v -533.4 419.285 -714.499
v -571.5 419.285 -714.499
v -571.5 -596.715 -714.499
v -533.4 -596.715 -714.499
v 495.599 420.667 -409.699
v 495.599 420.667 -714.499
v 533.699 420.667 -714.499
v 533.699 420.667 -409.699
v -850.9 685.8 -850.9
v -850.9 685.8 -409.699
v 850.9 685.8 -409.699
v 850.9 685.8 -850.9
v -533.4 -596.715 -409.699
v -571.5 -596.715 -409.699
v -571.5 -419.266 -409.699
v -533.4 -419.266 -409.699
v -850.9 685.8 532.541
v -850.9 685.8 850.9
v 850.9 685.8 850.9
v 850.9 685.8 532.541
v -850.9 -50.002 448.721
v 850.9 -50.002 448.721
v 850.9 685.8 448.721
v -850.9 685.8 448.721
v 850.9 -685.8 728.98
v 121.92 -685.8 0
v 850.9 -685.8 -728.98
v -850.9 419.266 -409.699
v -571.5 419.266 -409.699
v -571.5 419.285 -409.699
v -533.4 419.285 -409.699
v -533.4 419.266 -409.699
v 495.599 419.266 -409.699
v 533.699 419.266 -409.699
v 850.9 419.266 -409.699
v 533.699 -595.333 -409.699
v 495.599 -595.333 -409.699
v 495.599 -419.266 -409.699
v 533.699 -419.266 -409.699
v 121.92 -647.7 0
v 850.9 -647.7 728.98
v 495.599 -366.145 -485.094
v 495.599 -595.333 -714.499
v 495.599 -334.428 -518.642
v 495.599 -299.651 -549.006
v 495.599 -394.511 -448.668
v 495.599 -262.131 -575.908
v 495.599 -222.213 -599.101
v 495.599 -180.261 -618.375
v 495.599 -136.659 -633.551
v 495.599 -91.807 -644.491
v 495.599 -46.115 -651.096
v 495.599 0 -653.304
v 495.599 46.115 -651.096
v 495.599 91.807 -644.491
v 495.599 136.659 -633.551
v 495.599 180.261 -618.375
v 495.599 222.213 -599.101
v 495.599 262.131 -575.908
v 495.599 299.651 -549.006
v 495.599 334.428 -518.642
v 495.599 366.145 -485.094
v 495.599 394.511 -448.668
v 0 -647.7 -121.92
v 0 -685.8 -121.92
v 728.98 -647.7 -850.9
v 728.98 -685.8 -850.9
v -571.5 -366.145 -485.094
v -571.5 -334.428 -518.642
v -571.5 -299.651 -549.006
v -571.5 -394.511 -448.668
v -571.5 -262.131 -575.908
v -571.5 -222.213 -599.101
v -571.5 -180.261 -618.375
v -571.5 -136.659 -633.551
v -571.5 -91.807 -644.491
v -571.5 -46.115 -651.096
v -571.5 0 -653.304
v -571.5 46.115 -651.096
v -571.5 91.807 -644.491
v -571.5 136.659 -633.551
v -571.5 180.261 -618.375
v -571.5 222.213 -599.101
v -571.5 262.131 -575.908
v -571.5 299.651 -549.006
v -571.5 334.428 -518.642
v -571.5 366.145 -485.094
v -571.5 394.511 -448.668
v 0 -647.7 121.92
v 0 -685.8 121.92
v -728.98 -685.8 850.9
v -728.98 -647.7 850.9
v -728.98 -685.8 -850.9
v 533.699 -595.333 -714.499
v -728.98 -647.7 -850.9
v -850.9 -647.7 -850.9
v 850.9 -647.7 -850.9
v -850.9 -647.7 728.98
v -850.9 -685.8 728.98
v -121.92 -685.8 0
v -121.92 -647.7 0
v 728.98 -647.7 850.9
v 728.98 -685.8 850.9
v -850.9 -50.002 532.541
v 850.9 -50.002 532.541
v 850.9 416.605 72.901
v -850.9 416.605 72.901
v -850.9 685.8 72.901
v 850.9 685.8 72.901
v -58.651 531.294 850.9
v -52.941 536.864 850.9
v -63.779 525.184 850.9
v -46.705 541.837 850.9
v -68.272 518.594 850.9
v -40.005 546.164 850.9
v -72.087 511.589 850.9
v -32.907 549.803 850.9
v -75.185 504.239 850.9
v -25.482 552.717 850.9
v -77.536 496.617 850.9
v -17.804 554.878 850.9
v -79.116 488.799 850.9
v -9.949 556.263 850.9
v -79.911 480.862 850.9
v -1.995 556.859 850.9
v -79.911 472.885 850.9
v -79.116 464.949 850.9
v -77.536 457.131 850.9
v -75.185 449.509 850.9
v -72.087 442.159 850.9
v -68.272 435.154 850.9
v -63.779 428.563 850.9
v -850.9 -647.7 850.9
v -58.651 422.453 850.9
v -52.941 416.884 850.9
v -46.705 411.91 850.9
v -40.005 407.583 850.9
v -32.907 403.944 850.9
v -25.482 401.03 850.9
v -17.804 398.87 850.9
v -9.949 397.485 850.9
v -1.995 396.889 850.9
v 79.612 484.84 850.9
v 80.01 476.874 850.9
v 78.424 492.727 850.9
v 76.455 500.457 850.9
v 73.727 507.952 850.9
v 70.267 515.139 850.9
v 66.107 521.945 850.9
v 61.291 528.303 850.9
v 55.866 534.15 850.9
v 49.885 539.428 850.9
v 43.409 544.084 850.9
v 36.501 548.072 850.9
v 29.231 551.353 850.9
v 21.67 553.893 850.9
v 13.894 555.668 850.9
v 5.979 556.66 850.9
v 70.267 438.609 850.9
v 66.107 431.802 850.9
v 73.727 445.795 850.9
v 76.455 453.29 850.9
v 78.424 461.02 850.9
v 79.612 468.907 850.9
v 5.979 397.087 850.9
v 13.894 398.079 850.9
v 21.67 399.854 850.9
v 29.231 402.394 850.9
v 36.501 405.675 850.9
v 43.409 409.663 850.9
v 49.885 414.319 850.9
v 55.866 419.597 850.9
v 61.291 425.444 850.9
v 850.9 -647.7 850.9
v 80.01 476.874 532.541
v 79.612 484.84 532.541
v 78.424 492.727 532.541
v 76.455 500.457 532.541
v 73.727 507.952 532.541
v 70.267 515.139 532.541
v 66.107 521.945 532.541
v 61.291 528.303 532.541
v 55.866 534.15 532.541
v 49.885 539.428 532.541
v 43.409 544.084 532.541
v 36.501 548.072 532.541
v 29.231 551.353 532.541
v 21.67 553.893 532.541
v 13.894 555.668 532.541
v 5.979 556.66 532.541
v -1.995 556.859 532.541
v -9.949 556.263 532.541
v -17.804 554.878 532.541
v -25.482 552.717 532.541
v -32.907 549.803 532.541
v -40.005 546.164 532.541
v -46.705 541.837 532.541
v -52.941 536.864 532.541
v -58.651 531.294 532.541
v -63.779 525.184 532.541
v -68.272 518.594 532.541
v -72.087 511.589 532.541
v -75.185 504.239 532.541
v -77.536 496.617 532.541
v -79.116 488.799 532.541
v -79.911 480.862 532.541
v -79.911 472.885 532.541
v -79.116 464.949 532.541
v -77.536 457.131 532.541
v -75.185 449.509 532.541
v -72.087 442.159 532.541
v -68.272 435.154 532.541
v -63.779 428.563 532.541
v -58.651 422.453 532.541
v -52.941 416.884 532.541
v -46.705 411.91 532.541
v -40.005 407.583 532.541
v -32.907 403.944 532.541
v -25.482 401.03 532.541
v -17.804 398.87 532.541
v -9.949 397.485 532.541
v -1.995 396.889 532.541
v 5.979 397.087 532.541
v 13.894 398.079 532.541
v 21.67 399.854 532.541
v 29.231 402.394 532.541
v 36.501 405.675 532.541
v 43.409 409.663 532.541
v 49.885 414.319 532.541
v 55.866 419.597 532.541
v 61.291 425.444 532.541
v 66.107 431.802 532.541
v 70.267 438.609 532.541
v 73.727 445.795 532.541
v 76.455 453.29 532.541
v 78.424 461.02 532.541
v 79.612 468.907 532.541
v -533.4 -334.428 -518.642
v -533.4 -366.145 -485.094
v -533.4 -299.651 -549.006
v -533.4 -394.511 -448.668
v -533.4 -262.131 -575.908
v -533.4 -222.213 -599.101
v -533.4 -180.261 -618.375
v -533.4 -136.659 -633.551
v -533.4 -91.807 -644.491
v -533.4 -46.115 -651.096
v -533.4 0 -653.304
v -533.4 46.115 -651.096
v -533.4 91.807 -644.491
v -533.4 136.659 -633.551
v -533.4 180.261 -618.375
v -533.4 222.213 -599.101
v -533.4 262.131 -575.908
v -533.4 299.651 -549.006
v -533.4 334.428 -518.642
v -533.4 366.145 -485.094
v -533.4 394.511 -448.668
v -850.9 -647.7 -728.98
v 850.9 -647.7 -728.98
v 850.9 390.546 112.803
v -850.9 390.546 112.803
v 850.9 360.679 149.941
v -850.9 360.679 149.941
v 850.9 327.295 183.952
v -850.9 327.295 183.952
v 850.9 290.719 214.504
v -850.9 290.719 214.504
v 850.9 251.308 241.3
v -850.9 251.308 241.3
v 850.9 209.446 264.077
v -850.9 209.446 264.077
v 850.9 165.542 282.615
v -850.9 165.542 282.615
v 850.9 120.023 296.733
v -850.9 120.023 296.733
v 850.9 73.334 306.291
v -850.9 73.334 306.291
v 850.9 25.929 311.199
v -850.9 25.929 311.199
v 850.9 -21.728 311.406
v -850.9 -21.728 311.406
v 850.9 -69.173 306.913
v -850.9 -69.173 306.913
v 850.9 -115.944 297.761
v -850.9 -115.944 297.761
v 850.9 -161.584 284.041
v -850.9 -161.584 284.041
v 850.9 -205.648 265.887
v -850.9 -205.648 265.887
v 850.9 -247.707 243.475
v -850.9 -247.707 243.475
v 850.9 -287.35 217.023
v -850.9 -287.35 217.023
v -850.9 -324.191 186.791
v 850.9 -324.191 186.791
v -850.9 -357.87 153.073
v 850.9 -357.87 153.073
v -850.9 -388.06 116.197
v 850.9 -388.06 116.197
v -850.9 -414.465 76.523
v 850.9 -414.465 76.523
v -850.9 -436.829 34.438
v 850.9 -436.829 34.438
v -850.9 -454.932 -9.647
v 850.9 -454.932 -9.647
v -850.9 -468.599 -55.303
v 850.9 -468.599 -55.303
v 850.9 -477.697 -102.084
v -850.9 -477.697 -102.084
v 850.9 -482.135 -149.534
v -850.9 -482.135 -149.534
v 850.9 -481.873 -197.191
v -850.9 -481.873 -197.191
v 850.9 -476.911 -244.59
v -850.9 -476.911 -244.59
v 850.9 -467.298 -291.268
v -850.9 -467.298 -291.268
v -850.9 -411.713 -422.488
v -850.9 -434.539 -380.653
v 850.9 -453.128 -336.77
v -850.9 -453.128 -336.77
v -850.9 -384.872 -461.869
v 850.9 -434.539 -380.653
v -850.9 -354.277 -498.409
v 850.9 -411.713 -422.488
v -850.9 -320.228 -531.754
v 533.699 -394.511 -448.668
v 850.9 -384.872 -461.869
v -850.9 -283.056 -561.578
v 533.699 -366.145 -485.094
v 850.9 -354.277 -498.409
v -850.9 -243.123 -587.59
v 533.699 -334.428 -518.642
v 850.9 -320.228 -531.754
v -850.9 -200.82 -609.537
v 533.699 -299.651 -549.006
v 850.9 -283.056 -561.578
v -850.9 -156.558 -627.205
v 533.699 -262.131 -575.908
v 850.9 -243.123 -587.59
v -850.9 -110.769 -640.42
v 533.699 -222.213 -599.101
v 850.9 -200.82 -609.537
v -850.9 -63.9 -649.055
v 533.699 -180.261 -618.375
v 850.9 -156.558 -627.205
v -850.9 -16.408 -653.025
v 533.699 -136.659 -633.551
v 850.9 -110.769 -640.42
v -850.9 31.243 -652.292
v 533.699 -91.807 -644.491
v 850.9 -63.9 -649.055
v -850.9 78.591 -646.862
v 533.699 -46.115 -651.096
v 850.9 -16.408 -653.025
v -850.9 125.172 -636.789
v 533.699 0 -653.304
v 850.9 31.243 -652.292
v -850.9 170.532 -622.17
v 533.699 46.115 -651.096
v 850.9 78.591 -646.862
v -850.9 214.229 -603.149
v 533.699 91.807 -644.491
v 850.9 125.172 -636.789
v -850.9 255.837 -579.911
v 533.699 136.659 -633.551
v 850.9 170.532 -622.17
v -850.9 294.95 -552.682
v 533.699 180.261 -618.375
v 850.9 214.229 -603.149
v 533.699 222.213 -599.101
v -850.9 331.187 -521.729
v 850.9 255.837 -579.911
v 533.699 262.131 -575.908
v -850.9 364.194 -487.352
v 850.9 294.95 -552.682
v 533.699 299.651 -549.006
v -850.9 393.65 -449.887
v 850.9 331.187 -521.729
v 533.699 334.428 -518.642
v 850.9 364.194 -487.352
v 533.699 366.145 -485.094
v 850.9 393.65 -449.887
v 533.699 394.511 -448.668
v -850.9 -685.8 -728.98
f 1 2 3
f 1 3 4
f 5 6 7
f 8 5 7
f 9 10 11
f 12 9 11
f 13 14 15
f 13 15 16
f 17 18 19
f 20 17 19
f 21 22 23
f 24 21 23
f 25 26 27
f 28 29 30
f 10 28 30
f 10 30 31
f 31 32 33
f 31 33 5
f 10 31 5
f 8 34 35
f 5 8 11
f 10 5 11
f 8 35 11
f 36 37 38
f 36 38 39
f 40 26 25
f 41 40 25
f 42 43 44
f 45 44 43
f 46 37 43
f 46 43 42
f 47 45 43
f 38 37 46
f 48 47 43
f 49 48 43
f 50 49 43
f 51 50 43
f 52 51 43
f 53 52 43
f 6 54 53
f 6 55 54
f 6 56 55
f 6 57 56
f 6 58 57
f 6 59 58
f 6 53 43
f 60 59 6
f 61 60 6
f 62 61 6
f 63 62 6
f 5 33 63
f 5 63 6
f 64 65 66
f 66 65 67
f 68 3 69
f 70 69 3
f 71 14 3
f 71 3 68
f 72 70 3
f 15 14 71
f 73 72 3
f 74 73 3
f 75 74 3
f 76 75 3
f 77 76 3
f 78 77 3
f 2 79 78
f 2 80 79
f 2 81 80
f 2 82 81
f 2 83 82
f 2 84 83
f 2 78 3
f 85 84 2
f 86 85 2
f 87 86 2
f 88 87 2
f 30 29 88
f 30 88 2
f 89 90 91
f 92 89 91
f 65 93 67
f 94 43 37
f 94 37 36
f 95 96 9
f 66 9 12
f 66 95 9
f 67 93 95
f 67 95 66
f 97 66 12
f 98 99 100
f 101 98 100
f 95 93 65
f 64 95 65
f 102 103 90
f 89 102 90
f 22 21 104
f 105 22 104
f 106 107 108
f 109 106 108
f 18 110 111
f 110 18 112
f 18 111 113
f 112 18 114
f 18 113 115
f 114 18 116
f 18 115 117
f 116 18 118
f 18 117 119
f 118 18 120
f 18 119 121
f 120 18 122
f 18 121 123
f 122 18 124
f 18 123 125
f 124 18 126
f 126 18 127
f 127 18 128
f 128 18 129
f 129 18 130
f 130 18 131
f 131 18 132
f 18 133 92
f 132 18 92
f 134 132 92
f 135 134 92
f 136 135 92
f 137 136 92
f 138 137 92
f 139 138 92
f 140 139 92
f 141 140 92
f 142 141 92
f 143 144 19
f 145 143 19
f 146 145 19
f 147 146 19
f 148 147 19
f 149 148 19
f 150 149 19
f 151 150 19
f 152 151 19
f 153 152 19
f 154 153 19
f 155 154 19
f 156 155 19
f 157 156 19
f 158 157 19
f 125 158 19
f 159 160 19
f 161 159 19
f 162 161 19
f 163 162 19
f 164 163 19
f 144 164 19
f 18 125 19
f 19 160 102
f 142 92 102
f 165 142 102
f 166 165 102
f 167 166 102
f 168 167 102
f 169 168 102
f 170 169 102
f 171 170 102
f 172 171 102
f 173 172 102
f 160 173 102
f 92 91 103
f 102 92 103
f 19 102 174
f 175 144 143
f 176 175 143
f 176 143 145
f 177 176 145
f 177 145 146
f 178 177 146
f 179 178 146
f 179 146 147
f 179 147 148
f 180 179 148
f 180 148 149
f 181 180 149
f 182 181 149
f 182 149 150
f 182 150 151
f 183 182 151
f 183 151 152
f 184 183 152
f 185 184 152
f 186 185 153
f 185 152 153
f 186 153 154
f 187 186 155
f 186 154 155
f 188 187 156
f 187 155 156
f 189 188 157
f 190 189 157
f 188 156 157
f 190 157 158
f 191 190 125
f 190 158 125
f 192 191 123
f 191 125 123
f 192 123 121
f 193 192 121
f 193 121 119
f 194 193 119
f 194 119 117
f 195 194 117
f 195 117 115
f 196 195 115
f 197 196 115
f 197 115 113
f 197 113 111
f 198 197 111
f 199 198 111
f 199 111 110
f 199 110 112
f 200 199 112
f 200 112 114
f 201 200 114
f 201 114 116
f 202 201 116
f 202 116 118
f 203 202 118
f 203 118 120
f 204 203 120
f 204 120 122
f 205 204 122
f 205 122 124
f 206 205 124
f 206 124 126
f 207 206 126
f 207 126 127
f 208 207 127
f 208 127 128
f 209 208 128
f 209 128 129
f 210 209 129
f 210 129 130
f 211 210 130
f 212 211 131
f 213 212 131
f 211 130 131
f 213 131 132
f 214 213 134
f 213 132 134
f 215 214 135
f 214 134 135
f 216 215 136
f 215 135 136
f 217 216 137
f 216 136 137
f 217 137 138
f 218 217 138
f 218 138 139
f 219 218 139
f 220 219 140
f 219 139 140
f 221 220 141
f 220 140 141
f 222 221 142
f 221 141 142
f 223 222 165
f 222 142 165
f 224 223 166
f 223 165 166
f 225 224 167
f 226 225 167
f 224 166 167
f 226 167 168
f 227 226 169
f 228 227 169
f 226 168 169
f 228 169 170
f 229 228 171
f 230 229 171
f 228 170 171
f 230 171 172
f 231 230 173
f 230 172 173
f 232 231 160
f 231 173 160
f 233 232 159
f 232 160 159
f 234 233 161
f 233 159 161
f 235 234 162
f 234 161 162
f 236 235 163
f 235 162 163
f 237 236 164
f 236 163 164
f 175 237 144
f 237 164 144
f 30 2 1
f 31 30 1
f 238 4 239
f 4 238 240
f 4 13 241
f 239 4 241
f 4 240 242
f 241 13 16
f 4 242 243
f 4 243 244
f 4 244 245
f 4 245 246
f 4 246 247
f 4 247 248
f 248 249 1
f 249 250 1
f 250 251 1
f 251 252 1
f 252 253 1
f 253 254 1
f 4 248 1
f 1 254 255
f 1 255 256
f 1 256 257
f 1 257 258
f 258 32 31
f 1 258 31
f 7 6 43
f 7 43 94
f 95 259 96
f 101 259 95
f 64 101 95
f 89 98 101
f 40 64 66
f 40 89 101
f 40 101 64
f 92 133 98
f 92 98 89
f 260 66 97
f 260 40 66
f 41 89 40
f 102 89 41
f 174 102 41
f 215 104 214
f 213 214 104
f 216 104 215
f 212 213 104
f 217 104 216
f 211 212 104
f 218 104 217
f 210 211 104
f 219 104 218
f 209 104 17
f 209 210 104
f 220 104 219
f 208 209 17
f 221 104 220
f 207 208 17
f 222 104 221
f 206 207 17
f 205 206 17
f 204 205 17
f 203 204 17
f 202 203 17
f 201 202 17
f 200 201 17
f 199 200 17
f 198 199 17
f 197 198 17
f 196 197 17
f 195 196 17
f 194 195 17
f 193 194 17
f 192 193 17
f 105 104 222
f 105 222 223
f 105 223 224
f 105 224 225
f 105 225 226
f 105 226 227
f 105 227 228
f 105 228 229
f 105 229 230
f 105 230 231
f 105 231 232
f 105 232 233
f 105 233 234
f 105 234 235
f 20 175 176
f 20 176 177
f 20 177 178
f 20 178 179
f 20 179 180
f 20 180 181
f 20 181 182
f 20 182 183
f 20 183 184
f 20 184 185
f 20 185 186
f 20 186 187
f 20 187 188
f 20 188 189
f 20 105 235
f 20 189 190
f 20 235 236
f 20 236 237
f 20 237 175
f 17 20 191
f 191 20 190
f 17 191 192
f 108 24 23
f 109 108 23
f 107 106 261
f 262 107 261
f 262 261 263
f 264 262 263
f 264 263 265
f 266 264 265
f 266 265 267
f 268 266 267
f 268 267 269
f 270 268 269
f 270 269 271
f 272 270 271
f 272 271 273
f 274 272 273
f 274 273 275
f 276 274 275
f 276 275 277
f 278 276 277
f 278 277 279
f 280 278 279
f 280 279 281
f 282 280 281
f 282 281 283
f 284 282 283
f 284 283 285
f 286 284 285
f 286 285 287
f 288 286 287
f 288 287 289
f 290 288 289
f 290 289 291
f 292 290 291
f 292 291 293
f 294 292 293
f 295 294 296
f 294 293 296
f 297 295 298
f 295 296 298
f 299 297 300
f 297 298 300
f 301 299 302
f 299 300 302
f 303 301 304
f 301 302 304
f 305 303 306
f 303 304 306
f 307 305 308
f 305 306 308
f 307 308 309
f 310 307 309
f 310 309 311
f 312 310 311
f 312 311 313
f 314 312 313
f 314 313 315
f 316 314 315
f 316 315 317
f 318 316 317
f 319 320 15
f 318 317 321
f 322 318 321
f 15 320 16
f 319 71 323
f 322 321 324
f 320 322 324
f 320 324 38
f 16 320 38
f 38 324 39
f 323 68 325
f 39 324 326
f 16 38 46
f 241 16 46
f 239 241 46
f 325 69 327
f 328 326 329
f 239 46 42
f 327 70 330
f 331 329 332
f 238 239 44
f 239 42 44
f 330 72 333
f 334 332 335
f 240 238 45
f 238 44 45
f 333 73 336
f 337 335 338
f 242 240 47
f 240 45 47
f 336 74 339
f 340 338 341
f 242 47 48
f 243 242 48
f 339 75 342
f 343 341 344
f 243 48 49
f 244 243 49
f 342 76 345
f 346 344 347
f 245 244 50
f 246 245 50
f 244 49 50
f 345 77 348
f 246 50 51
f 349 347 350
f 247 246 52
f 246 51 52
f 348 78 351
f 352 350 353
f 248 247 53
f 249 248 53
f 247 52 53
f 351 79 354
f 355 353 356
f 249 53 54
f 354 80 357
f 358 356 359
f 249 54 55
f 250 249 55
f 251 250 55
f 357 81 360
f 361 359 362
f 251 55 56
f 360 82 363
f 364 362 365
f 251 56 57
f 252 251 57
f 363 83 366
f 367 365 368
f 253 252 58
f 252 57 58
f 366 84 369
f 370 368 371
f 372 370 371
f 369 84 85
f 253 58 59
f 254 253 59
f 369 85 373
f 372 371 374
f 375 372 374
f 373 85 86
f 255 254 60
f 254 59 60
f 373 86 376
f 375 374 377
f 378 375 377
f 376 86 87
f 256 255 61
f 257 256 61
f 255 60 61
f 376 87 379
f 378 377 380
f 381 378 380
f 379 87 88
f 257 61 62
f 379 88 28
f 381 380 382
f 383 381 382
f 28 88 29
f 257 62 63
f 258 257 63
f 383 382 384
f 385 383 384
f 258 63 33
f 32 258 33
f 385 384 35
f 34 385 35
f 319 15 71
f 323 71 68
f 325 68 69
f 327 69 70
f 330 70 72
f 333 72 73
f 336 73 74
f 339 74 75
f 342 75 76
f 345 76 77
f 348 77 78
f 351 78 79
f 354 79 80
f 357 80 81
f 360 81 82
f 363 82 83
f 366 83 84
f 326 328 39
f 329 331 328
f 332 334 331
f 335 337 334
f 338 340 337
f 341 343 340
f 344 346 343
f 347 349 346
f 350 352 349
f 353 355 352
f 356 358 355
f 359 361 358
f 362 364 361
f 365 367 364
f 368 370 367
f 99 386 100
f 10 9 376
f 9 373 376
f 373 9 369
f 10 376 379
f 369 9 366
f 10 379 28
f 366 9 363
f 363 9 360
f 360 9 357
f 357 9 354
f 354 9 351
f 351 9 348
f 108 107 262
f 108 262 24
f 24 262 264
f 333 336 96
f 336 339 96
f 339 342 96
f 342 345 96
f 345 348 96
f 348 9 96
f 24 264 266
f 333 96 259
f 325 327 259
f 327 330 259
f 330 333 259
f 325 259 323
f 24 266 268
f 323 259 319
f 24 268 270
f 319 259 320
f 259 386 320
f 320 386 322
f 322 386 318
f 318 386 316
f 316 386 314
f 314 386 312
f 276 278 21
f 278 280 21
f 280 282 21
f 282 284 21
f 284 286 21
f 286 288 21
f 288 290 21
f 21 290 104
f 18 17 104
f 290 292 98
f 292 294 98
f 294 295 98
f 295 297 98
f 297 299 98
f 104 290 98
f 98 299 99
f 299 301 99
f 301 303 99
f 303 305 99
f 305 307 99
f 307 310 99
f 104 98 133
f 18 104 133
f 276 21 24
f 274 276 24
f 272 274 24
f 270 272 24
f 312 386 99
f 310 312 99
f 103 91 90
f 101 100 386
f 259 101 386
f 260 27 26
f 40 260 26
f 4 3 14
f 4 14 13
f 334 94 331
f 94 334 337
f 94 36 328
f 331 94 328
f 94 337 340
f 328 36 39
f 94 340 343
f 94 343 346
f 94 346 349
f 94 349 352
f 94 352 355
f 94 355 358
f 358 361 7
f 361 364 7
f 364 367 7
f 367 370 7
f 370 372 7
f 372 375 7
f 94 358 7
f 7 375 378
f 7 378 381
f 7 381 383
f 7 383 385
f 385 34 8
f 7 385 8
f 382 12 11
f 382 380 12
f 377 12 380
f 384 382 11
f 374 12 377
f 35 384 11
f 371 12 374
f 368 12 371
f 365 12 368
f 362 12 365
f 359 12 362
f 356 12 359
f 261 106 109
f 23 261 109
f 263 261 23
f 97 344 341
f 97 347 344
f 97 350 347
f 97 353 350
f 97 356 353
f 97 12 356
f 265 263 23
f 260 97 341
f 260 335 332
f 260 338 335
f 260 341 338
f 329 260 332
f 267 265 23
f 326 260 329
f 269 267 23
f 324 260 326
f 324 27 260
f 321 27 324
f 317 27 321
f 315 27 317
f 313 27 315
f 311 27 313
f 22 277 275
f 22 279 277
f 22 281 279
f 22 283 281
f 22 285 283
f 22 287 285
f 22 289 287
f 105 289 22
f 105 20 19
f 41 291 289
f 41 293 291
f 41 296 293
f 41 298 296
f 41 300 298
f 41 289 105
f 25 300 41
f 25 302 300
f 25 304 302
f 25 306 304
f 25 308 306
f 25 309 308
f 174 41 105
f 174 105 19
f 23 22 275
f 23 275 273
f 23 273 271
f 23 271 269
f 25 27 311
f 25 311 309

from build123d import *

# Parameters (mm, degrees)
F0_W          = 1701.8
F0_H          = 1701.8
F1_DEPTH      = 685.8
F1_DEPTH_BACK = 685.8
F3_R          = 482.6
F5_DEPTH      = 1778
F4_W          = 741.2019371986
F4_H          = 241.3
F6_DEPTH      = 1778
F7_W          = 762
F7_H          = 83.82
F8_DEPTH      = 1778
F10_DEPTH     = 38.1
F12_R         = 80.01
F13_DEPTH     = 320.04
F15_W         = 38.1
F15_H         = 1016
F16_DEPTH     = 304.8


with BuildPart() as f1:
    # F0 (on Front) → F1 (new body, two sides)
    with BuildSketch(Plane.XZ) as f1_sk:
        Rectangle(F0_W, F0_H)
    extrude(amount=F1_DEPTH)
    extrude(f1_sk.sketch, amount=-F1_DEPTH_BACK)

    # F3 (on face) → F5 (cut)
    with BuildSketch(Plane.YZ.offset(850.9)):
        with Locations((0, -170.704353589)):
            Circle(F3_R)
    extrude(amount=-F5_DEPTH, mode=Mode.SUBTRACT)

    # F4 (on face) → F6 (cut)
    with BuildSketch(Plane.YZ.offset(850.9)):
        with Locations((370.6009685993, -47.7492743492)):
            Rectangle(F4_W, F4_H)
        Polygon((741.2019371986, -168.3992743492), (0, -168.3992743492), (0, -409.6992743492), (741.8479657151, -409.6992743492), (741.8479657151, -168.3992743492), align=None)
    extrude(amount=-F6_DEPTH, mode=Mode.SUBTRACT)

    # F7 (on face) → F8 (cut)
    with BuildSketch(Plane.YZ.offset(850.9)):
        with Locations((330.9977193773, 490.6306193733)):
            Rectangle(F7_W, F7_H)
    extrude(amount=-F8_DEPTH, mode=Mode.SUBTRACT)

    # F9 (on face) → F10 (cut)
    with BuildSketch(Plane.XZ.offset(685.8)):
        Polygon((850.9, 728.98), (850.9, 850.9), (728.98, 850.9), (0, 121.92), (121.92, 0), align=None)
        Polygon((850.9, -728.98), (121.92, 0), (0, -121.92), (728.98, -850.9), (850.9, -850.9), align=None)
        Polygon((0, -121.92), (121.92, 0), (0, 121.92), (-121.92, 0), align=None)
        Polygon((-121.92, 0), (0, 121.92), (-728.98, 850.9), (-850.9, 850.9), (-850.9, 728.98), align=None)
        Polygon((-728.98, -850.9), (0, -121.92), (-121.92, 0), (-850.9, -728.98), (-850.9, -850.9), align=None)
    extrude(amount=-F10_DEPTH, mode=Mode.SUBTRACT)

    # F12 (on face) → F13 (cut)
    with BuildSketch(Plane.XY.offset(850.9)):
        with Locations((0, 476.8736362457)):
            Circle(F12_R)
    extrude(amount=-F13_DEPTH, mode=Mode.SUBTRACT)

    # F15 (on face) → F16 (cut)
    with BuildSketch(Plane.XY.offset(-409.6992743492)):
        with Locations((514.6490952492, -87.3333351612)):
            Rectangle(F15_W, F15_H)
        with Locations((-552.4504163742, -88.7147324085)):
            Rectangle(F15_W, F15_H)
    extrude(amount=-F16_DEPTH, mode=Mode.SUBTRACT)


solid = f1.part
